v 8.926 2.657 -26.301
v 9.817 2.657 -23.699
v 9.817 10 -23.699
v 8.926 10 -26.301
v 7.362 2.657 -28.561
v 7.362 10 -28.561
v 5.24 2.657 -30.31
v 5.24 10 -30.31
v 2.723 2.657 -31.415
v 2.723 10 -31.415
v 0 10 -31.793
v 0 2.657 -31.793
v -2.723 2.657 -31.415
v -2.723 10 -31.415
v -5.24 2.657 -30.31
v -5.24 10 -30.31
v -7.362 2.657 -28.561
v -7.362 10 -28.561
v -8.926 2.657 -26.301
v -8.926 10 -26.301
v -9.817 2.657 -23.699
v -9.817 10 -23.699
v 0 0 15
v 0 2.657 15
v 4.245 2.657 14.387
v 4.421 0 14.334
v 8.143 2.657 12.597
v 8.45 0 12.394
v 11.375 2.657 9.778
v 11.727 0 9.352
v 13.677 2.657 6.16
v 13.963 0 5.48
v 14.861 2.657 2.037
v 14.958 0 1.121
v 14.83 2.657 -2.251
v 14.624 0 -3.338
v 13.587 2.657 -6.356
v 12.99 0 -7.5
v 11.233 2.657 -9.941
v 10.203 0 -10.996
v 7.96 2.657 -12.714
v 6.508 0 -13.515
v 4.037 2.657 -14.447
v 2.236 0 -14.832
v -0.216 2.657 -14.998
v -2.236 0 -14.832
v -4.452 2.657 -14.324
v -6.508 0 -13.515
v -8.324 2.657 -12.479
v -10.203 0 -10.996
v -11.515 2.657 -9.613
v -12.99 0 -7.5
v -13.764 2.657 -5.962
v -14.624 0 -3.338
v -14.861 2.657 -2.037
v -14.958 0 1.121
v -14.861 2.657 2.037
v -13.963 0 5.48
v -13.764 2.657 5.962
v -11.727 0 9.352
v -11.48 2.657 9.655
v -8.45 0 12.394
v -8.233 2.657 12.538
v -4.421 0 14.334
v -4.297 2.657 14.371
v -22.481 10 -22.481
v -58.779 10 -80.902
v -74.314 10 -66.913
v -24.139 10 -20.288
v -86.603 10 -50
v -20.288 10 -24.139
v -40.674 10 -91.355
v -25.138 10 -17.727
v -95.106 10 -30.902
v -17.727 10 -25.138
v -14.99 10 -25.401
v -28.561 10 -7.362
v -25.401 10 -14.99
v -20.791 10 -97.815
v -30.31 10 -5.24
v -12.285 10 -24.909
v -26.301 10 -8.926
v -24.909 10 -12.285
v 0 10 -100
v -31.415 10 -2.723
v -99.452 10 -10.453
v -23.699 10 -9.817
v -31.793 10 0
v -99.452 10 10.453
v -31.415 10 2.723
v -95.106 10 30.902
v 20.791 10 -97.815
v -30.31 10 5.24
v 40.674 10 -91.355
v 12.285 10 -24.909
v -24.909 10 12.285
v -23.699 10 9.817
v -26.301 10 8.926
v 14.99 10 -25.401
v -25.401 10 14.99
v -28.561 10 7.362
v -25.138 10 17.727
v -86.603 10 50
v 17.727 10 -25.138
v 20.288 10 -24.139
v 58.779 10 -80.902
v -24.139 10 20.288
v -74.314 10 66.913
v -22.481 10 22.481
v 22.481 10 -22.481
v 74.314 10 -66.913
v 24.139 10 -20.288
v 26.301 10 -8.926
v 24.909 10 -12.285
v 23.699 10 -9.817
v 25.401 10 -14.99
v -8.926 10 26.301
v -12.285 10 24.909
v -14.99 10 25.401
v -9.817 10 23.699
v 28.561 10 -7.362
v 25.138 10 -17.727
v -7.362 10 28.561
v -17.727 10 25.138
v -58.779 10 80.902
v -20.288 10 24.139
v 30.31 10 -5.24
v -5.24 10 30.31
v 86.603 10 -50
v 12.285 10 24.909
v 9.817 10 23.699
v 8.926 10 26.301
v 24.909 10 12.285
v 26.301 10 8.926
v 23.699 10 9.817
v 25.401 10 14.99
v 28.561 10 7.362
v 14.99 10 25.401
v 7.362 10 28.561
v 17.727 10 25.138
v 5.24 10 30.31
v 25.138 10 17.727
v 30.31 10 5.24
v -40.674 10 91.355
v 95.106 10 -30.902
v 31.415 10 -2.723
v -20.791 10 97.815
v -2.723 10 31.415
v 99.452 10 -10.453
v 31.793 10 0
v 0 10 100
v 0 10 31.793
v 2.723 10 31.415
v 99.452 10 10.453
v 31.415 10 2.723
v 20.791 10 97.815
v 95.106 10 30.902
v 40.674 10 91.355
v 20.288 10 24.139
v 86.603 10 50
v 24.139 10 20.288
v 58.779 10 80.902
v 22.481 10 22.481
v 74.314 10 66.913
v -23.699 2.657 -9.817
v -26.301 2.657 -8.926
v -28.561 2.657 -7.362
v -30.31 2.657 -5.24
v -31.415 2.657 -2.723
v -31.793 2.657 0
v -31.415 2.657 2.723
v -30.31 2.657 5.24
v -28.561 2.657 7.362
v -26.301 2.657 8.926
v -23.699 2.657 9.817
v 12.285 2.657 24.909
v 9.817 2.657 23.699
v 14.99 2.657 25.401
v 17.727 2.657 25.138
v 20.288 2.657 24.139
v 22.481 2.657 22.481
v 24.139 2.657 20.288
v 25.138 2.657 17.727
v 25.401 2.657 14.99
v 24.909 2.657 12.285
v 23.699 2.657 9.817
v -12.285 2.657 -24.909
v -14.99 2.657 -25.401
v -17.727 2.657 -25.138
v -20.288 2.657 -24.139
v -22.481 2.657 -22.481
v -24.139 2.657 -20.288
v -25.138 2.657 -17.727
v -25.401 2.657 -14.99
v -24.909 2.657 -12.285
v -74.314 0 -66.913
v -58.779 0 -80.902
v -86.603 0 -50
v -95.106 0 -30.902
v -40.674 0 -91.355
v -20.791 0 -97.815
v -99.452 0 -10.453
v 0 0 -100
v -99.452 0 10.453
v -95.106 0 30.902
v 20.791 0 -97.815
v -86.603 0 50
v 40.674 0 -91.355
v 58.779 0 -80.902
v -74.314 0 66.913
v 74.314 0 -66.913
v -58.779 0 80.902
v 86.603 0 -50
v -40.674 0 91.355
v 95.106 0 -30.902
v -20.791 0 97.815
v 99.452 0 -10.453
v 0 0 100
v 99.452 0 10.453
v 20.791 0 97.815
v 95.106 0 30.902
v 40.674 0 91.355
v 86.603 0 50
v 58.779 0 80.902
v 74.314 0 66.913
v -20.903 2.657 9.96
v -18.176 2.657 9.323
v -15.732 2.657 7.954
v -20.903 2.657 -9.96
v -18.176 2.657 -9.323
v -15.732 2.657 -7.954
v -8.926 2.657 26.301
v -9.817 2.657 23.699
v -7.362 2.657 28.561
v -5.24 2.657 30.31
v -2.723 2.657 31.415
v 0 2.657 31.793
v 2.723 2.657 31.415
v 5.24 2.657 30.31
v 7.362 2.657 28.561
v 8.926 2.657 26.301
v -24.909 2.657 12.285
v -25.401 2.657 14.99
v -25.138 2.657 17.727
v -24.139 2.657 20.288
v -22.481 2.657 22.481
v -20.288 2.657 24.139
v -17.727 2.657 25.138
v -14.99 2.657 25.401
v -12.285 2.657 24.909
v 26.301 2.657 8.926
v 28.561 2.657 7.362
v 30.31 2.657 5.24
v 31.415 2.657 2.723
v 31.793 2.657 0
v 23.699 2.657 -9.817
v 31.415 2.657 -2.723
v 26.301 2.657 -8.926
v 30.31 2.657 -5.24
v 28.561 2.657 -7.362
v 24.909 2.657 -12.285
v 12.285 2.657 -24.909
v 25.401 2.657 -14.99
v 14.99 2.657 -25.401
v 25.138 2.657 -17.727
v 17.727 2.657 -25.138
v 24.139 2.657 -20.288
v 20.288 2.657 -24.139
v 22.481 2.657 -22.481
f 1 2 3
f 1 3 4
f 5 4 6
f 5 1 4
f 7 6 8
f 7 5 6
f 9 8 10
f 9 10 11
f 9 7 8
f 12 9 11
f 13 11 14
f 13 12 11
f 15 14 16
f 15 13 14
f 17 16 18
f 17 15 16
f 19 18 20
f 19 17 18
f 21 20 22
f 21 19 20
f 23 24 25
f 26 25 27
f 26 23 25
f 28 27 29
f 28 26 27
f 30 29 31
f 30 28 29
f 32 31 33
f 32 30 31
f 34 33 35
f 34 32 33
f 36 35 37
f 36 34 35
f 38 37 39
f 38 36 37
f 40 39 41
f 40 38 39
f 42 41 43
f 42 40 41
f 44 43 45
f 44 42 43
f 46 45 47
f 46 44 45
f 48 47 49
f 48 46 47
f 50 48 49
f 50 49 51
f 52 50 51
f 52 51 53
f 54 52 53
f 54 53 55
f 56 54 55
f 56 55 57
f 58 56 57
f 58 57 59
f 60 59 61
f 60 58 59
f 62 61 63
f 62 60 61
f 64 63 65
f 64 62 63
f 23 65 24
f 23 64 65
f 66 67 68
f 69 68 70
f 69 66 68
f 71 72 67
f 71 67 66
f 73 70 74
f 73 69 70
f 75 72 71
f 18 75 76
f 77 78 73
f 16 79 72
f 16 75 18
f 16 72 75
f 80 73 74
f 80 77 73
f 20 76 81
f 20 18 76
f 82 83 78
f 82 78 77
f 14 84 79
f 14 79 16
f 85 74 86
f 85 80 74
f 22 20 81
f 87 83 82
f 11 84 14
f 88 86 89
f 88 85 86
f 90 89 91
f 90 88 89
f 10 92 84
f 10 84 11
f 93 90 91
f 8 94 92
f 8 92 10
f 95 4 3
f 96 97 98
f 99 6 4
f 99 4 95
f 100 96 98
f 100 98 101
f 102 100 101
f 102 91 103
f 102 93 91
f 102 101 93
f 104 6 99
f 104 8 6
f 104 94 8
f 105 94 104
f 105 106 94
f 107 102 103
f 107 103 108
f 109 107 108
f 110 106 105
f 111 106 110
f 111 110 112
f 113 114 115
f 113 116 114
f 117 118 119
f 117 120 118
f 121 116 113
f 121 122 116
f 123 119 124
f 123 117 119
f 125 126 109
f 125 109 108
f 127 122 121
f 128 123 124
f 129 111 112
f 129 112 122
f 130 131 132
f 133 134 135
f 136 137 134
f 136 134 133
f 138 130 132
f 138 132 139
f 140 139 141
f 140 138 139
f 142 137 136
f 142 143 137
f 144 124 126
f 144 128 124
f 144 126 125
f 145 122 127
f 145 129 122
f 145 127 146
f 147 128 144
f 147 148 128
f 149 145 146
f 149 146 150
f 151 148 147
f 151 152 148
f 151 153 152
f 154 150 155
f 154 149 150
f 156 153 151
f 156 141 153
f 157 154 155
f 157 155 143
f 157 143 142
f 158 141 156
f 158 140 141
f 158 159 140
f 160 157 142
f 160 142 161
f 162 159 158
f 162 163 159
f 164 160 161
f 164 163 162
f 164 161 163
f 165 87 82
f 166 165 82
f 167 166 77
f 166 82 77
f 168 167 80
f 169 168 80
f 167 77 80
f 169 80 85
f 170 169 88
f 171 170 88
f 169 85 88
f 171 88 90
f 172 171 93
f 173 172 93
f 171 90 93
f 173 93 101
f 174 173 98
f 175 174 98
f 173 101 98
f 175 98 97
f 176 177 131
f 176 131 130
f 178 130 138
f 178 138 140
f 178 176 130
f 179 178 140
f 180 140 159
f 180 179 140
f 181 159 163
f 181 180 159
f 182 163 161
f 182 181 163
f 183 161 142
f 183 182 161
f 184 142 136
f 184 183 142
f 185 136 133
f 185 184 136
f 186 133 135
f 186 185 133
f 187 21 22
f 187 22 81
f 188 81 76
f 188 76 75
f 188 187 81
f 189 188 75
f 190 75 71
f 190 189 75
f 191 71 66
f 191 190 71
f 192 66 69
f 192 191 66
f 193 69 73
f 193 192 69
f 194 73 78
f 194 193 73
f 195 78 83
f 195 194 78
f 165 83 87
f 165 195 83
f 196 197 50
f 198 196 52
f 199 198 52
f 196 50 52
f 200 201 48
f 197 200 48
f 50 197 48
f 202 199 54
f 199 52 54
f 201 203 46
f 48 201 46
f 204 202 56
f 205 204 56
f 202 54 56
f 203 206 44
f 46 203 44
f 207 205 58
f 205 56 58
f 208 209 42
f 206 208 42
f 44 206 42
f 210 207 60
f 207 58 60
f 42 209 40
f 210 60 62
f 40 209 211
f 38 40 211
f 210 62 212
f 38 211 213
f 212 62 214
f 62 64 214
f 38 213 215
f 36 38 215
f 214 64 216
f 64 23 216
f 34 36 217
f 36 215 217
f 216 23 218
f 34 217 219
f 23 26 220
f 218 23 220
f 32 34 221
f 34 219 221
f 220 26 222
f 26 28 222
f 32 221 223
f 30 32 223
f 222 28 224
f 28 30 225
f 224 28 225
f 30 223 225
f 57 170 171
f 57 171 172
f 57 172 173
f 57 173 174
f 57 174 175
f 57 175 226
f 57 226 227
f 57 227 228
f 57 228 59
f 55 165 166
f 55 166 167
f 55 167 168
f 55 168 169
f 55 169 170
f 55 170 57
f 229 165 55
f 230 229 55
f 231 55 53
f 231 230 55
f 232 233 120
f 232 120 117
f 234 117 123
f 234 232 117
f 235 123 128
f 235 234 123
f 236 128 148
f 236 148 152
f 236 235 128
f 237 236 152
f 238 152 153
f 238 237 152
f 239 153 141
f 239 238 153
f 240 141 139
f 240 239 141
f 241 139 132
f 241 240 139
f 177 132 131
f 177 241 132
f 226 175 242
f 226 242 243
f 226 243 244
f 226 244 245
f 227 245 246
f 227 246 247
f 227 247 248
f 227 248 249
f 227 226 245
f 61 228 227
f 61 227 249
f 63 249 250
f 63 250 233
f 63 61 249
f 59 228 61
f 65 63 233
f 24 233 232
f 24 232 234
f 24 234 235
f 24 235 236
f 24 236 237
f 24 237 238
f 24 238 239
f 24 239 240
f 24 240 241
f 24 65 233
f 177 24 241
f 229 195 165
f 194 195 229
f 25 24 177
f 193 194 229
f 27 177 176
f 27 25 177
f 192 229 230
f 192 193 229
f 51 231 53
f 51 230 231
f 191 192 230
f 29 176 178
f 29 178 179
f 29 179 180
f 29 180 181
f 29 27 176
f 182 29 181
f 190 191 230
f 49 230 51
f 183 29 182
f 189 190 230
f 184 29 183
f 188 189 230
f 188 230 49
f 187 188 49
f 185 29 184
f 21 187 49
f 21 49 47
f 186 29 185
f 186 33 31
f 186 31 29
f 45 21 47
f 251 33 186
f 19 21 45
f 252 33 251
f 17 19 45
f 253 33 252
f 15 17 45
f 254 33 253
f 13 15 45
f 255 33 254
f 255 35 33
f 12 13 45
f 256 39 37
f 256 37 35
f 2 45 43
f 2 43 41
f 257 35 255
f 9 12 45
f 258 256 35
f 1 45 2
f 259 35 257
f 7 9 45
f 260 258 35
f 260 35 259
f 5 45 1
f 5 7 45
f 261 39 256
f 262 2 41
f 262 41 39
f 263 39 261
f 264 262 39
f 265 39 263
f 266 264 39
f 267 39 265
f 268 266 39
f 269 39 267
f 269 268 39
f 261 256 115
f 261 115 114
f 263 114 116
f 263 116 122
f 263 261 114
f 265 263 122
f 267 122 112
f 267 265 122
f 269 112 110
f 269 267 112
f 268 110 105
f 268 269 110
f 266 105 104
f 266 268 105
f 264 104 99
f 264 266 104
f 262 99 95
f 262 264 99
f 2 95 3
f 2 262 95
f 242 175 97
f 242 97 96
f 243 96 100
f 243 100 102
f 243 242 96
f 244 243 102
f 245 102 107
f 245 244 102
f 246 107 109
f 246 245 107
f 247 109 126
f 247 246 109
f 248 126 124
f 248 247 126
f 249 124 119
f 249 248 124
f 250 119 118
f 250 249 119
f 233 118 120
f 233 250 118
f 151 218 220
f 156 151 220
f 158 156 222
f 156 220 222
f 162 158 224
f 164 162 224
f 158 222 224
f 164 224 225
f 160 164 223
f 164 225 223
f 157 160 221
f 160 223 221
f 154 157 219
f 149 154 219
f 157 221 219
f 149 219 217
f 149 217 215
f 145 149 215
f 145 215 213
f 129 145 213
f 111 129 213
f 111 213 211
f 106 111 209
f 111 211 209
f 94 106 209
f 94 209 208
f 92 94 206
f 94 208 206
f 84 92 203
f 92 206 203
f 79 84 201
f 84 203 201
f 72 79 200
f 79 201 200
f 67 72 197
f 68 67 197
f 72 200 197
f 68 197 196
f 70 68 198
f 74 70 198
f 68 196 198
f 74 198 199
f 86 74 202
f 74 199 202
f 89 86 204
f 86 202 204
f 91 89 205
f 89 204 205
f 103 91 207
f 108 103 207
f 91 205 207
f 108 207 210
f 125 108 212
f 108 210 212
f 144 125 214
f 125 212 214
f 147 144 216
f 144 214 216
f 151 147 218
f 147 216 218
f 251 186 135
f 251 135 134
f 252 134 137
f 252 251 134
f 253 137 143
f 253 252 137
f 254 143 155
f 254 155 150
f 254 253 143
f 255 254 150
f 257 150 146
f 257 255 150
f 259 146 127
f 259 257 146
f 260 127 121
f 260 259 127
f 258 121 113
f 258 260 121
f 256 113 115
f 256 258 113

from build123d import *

# Parameters (mm, degrees)
SKETCH1_R           = 100
BOSS_EXTRUDE1_DEPTH = 10
SKETCH2_R           = 15
CUT_EXTRUDE1_DEPTH  = 142.774468788
SKETCH3_R           = 10
CUT_EXTRUDE2_DEPTH  = 7.34269734
CIRPATTERN1_COUNT   = 8


with BuildPart() as part:
    # Sketch1 → Boss-Extrude1 (new body)
    with BuildSketch(Plane(origin=(0, 0, 0), x_dir=(1, 0, 0), z_dir=(0, 1, 0))):
        Circle(SKETCH1_R)
    extrude(amount=BOSS_EXTRUDE1_DEPTH)

    # Sketch2 → Cut-Extrude1 (cut, through all)
    with BuildSketch(Plane(origin=(0, 0, 0), x_dir=(1, 0, 0), z_dir=(0, 1, 0))):
        Circle(SKETCH2_R)
    extrude(amount=CUT_EXTRUDE1_DEPTH, mode=Mode.SUBTRACT)

    # Sketch3 → Cut-Extrude2 (cut)
    with BuildSketch(Plane(origin=(0, 10, 0), x_dir=(1, 0, 0), z_dir=(0, 1, 0))):
        with Locations((-21.793050468, 0)):
            Circle(SKETCH3_R)
    cut_extrude2 = extrude(amount=-CUT_EXTRUDE2_DEPTH, mode=Mode.SUBTRACT)

    # CirPattern1: Cut-Extrude2 ×8 about axis
    cirpattern1_axis = Axis((0, 0, 0), (0, 1, 0))
    for i in range(1, CIRPATTERN1_COUNT):
        add(cut_extrude2.rotate(cirpattern1_axis, i * 360 / CIRPATTERN1_COUNT), mode=Mode.SUBTRACT)


solid = part.part
